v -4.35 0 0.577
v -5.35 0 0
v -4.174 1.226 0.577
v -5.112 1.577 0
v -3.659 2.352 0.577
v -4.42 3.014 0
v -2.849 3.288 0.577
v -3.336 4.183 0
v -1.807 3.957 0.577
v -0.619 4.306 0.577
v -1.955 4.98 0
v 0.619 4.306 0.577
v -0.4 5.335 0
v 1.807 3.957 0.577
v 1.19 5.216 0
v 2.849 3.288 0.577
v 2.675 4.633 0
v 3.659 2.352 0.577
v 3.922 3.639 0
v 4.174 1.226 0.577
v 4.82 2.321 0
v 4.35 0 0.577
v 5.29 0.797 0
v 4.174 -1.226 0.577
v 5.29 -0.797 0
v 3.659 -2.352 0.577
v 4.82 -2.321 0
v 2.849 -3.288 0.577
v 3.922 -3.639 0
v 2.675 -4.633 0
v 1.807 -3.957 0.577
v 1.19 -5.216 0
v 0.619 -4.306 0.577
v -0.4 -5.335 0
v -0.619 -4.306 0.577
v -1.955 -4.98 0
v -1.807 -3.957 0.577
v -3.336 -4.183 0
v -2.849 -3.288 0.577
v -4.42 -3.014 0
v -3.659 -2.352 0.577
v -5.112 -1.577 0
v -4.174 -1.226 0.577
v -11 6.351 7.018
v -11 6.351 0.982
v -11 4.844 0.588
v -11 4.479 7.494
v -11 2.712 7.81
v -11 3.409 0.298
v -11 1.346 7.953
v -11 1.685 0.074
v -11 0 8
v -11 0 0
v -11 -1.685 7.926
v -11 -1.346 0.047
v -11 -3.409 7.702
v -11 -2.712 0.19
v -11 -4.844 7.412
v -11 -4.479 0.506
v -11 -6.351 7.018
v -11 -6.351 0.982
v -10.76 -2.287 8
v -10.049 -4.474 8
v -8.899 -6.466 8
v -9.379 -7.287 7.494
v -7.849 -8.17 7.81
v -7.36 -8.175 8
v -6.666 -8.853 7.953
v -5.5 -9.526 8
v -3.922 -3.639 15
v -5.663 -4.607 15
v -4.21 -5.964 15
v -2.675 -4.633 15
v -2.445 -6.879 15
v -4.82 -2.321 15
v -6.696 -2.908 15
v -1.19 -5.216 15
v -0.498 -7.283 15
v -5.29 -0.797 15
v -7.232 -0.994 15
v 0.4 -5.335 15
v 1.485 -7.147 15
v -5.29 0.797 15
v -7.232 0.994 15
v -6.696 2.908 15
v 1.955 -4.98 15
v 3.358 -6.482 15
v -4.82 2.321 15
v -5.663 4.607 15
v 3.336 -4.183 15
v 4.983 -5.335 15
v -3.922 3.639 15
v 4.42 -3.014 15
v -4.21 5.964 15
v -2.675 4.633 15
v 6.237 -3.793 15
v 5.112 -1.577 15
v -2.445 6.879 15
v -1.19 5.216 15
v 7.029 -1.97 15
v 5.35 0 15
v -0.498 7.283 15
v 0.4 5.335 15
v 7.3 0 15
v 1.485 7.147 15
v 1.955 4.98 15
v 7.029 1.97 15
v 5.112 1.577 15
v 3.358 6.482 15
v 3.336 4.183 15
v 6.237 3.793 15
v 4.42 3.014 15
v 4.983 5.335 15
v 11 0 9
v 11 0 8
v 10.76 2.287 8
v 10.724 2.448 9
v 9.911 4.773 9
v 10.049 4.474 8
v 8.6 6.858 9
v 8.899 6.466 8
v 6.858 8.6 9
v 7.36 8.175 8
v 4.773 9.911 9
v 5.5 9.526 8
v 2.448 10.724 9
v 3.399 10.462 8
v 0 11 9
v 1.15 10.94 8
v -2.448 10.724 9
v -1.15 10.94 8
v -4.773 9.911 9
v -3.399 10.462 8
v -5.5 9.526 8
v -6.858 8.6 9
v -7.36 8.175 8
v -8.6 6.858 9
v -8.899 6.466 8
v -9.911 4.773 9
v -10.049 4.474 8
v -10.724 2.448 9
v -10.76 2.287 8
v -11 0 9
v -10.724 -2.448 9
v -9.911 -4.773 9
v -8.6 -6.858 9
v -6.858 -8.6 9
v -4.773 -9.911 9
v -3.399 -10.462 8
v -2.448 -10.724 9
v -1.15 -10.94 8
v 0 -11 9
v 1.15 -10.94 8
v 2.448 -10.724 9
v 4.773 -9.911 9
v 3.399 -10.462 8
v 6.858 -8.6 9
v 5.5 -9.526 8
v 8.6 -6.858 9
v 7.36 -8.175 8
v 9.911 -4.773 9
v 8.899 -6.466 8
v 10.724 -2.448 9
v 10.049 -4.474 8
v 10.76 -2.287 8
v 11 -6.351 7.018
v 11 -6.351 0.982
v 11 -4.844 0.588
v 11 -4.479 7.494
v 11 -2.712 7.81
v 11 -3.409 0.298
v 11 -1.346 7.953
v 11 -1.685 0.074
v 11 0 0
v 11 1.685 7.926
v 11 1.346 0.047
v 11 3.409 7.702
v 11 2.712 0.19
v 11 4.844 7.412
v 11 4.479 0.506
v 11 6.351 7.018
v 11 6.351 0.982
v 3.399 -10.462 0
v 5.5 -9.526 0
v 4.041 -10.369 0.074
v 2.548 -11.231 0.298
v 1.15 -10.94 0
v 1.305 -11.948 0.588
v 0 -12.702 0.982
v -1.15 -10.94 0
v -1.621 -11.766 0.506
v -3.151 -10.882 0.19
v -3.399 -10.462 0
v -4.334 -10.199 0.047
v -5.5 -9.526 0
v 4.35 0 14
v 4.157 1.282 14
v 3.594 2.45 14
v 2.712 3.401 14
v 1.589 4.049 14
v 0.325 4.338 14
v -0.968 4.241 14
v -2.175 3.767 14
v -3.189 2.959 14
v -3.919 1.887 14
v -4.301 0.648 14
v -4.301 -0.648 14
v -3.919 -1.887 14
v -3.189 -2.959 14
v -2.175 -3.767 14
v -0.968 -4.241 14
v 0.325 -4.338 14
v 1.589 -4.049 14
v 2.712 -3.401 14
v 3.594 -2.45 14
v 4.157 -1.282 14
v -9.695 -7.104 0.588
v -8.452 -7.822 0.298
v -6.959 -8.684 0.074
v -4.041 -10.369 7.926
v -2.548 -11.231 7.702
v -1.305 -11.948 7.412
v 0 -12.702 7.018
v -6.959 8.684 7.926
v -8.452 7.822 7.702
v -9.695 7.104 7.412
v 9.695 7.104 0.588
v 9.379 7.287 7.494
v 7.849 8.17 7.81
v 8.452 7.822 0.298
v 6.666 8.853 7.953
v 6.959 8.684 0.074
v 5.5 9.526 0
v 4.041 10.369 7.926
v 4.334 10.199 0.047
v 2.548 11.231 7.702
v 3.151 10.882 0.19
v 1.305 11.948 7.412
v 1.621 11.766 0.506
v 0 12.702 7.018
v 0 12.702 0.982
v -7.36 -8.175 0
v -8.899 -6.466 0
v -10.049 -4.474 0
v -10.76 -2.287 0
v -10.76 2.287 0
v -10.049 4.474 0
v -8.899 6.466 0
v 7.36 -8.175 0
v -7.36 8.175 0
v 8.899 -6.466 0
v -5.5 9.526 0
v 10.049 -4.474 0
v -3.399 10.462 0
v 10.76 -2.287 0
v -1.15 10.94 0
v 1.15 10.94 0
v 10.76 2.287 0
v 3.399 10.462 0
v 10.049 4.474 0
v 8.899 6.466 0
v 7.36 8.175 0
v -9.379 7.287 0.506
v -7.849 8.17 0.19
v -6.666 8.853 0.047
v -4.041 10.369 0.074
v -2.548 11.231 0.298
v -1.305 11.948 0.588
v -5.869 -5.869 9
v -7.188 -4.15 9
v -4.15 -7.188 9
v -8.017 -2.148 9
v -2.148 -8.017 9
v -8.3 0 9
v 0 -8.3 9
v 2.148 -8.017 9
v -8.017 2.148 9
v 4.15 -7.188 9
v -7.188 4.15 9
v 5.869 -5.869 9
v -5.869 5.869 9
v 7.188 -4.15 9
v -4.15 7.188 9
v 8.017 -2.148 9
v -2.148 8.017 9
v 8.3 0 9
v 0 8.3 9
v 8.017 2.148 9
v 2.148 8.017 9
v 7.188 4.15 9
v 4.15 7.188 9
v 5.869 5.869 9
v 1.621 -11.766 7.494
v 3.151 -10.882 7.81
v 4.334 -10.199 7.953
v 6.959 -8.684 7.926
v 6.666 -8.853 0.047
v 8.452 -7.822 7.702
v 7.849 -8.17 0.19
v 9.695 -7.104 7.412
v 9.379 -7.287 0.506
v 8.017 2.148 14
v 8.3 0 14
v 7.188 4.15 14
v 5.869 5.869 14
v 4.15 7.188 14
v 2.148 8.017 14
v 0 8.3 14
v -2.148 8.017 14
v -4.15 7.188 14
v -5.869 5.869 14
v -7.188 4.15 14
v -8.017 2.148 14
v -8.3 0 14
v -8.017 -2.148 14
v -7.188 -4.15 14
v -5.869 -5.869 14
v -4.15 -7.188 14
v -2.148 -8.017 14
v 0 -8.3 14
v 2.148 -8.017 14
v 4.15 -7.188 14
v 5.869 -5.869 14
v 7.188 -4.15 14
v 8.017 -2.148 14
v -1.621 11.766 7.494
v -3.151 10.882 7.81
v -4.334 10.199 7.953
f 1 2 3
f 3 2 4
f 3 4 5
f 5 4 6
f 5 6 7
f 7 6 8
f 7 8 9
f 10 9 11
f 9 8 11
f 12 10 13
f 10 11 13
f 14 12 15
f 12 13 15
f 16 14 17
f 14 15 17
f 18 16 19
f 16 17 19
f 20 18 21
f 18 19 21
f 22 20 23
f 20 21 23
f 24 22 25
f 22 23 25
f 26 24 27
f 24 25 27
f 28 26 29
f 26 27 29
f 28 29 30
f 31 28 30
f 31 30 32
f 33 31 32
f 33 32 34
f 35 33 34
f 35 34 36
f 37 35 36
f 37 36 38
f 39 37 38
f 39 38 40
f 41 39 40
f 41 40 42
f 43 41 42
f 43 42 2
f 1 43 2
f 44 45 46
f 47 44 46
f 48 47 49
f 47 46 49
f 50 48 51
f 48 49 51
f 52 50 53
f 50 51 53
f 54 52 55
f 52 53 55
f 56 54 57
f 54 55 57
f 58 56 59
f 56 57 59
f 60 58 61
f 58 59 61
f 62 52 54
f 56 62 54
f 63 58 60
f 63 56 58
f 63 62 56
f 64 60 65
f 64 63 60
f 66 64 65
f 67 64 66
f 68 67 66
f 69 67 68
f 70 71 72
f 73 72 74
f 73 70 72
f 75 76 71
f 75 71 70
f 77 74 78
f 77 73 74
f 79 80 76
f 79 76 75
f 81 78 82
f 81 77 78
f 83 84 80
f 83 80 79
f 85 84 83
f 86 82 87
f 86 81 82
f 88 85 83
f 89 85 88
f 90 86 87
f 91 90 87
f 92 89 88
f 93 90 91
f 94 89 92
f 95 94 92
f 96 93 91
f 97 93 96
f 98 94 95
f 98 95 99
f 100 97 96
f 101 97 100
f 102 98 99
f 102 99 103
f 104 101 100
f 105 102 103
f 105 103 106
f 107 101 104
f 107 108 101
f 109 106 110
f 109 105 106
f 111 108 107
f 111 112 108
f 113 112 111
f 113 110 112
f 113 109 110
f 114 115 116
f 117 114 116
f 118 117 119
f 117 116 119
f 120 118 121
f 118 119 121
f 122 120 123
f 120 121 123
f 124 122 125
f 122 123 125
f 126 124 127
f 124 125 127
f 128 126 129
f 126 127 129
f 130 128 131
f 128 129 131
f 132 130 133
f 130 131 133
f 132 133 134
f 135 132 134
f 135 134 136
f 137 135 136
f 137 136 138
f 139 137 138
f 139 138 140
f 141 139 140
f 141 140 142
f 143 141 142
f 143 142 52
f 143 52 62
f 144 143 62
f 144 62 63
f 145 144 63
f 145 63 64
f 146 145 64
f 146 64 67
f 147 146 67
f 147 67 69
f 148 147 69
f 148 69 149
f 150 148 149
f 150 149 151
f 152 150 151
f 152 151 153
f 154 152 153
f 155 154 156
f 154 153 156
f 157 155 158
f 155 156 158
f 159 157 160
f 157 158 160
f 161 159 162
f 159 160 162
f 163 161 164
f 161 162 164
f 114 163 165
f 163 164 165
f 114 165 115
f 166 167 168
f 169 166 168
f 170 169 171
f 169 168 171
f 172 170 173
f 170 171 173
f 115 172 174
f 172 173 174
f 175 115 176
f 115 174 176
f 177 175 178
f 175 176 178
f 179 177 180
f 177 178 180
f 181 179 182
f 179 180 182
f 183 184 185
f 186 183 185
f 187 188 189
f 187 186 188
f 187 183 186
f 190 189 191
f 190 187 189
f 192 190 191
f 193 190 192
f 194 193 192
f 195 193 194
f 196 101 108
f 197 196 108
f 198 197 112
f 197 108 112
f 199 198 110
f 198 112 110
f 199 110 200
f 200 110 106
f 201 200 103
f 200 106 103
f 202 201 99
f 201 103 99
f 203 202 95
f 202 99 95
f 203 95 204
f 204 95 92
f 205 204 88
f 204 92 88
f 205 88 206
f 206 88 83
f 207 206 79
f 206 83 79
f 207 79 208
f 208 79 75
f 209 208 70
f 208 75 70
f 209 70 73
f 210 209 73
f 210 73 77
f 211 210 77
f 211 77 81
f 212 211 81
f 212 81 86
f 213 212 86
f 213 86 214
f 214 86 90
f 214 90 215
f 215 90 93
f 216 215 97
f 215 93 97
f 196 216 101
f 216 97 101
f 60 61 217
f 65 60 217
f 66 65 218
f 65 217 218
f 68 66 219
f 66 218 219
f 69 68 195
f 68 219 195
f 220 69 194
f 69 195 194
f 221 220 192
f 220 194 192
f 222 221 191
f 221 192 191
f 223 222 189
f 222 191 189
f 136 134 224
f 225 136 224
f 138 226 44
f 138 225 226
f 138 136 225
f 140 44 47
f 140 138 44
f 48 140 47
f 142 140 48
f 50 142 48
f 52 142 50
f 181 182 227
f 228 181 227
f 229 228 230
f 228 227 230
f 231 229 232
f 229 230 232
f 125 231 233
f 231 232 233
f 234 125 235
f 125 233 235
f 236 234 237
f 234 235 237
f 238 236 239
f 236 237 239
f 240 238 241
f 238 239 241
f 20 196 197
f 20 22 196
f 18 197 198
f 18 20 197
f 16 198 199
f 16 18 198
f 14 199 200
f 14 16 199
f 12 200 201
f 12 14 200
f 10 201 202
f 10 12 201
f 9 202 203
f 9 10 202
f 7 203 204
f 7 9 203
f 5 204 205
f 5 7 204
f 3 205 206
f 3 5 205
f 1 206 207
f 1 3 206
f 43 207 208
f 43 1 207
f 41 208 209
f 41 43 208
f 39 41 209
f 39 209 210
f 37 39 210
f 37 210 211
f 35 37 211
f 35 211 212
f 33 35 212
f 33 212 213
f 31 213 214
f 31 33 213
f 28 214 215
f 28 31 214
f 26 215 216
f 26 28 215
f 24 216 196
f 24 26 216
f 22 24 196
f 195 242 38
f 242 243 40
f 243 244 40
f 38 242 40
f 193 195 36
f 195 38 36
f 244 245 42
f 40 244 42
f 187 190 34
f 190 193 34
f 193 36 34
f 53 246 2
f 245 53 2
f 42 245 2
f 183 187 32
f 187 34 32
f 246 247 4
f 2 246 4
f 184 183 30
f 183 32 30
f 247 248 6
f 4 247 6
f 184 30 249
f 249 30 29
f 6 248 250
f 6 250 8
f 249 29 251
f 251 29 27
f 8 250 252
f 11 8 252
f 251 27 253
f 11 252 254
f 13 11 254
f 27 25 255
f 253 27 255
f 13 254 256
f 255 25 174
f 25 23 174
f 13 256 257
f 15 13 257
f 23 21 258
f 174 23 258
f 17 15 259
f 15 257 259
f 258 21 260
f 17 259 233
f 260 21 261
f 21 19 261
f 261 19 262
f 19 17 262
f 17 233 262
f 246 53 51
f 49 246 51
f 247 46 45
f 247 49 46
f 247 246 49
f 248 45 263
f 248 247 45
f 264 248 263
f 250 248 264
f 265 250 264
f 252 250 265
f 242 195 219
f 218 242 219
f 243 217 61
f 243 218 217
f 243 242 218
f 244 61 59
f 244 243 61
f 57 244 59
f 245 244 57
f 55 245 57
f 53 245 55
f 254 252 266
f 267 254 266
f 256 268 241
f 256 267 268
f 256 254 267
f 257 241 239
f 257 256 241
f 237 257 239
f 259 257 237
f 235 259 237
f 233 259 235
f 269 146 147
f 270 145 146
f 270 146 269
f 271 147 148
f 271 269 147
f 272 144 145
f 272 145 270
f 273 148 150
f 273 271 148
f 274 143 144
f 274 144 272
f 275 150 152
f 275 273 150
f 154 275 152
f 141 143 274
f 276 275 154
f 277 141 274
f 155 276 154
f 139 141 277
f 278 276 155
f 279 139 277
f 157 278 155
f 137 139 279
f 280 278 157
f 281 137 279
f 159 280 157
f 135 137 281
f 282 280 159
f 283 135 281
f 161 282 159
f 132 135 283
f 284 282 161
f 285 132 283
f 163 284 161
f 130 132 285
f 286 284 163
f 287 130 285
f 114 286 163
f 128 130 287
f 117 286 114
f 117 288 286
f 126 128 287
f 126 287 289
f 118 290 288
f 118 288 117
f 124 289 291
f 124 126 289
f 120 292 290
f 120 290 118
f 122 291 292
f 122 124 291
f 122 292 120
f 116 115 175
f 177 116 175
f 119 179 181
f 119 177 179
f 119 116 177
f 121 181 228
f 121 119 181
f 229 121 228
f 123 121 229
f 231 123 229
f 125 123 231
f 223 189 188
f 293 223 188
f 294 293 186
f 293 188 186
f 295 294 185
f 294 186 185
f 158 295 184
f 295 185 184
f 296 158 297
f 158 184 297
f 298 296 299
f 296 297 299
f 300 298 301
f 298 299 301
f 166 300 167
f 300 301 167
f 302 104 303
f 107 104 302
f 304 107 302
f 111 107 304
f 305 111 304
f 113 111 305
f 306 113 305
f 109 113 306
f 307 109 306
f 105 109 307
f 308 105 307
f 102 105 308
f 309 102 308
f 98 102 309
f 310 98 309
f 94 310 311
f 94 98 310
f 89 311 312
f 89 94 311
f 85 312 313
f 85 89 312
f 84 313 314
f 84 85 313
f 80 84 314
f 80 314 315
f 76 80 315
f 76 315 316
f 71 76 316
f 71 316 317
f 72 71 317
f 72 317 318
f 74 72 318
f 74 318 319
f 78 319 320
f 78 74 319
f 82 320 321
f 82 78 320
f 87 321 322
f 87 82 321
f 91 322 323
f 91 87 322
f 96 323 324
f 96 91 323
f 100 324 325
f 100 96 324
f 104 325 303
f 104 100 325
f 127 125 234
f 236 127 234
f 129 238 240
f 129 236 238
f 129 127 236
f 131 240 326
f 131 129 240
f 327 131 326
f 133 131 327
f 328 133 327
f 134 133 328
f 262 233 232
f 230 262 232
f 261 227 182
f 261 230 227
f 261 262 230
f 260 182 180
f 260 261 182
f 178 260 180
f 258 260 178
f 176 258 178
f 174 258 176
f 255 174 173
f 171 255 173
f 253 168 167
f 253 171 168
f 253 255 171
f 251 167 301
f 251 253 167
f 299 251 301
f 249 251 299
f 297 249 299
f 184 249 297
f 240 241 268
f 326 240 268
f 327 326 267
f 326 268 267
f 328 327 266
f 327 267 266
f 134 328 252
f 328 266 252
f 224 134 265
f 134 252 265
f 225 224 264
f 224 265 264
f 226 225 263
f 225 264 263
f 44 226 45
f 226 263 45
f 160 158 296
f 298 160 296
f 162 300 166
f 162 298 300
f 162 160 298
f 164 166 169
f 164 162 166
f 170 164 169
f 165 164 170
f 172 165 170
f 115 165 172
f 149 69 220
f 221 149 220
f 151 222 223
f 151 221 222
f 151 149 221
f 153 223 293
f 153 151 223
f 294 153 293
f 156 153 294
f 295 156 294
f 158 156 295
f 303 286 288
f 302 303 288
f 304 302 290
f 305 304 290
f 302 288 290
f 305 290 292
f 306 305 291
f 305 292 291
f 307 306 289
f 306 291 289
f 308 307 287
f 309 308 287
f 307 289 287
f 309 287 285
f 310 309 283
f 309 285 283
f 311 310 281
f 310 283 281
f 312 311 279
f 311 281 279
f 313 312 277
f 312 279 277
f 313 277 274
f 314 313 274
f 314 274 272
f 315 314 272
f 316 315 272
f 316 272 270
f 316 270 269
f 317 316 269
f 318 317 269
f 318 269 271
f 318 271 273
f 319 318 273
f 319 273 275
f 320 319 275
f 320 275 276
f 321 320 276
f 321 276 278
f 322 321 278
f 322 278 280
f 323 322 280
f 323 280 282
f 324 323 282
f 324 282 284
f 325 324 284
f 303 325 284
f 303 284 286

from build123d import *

# Parameters (mm, degrees)
SKETCH1_R                            = 4.35
BOSS_EXTRUDE1_DEPTH                  = 8
SKETCH2_R                            = 11
SKETCH2_R_2                          = 4.35
BOSS_EXTRUDE2_DEPTH                  = 1
SKETCH3_R                            = 8.3
SKETCH3_R_2                          = 4.35
BOSS_EXTRUDE3_DEPTH                  = 6
SZKIC9_OUTSIDE_W                     = 34.824
SZKIC9_OUTSIDE_H                     = 38.228
SZKIC9_OUTSIDE_R                     = 11
WYTNIJ_WYCI_GNI_CIE3_DEPTH           = 1
WYTNIJ_WYCI_GNI_CIE3_DRAFT           = -60
SZKIC10_OUTSIDE_W                    = 34.824
SZKIC10_OUTSIDE_H                    = 38.228
SZKIC10_OUTSIDE_R                    = 11
WYTNIJ_WYCI_GNI_CIE4_DEPTH           = 1
WYTNIJ_WYCI_GNI_CIE4_DRAFT           = -60
SZKIC11_R                            = 5.35
WYTNIJ_WYCI_GNI_CIE5_DEPTH           = 1
WYTNIJ_WYCI_GNI_CIE5_DRAFT           = -60
SZKIC13_OUTSIDE_W                    = 33.36
SZKIC13_OUTSIDE_H                    = 36.764
SZKIC13_OUTSIDE_R                    = 7.3
WYTNIJ_WYCI_GNI_CIE8_DEPTH           = 1
WYTNIJ_WYCI_GNI_CIE8_DRAFT           = -45
SZKIC13_OUTSIDE_R_2                  = 5.35
WYTNIJ_WYCI_GNI_CIE8_PROFILE_2_DEPTH = 1
WYTNIJ_WYCI_GNI_CIE8_PROFILE_2_DRAFT = -45


with BuildPart() as part:
    # Sketch1 → Boss-Extrude1 (new body)
    with BuildSketch(Plane.XY):
        Polygon((-11, 6.350852961), (-11, -6.350852961), (0, -12.701705922), (11, -6.350852961), (11, 6.350852961), (0, 12.701705922), align=None)
        Circle(SKETCH1_R, mode=Mode.SUBTRACT)
    extrude(amount=BOSS_EXTRUDE1_DEPTH)

    # Sketch2 → Boss-Extrude2 (add)
    with BuildSketch(Plane.XY.offset(8)):
        Circle(SKETCH2_R)
        Circle(SKETCH2_R_2, mode=Mode.SUBTRACT)
    extrude(amount=BOSS_EXTRUDE2_DEPTH)

    # Sketch3 → Boss-Extrude3 (add)
    with BuildSketch(Plane.XY.offset(9)):
        Circle(SKETCH3_R)
        Circle(SKETCH3_R_2, mode=Mode.SUBTRACT)
    extrude(amount=BOSS_EXTRUDE3_DEPTH)


with BuildPart() as wytnij_wyci_gni_cie3_tool:
    # Szkic9 outside → Wytnij-wyciągnięcie3 (with draft: the straight prism first)
    with BuildSketch(Plane(origin=(0, 0, 0), x_dir=(-1, 0, 0), z_dir=(0, 0, -1))):
        Rectangle(SZKIC9_OUTSIDE_W, SZKIC9_OUTSIDE_H)
        with Locations(Location((0, 0, 0), (0, 0, 180))):
            Circle(SZKIC9_OUTSIDE_R, mode=Mode.SUBTRACT)
    extrude(amount=-WYTNIJ_WYCI_GNI_CIE3_DEPTH)
    # Wytnij-wyciągnięcie3: the draft: its side faces are tilted about the plane it starts from
    wytnij_wyci_gni_cie3_sides = [wytnij_wyci_gni_cie3_tool.faces().sort_by_distance(p)[0] for p in [
        (0, -19.114, 0.5),
        (-17.412, 0, 0.5),
        (0, 19.114, 0.5),
        (17.412, 0, 0.5),
        (-11, 0, 0.5),
    ]]
    draft(wytnij_wyci_gni_cie3_sides, Plane(origin=(0, 0, 0), x_dir=(-1, 0, 0), z_dir=(0, 0, -1)), WYTNIJ_WYCI_GNI_CIE3_DRAFT)


with BuildPart() as part_1:
    add(part.part)

    # Wytnij-wyciągnięcie3: cut by wytnij_wyci_gni_cie3_tool
    add(wytnij_wyci_gni_cie3_tool.part, mode=Mode.SUBTRACT)


with BuildPart() as wytnij_wyci_gni_cie4_tool:
    # Szkic10 outside → Wytnij-wyciągnięcie4 (with draft: the straight prism first)
    with BuildSketch(Plane.XY.offset(8)):
        Rectangle(SZKIC10_OUTSIDE_W, SZKIC10_OUTSIDE_H)
        Circle(SZKIC10_OUTSIDE_R, mode=Mode.SUBTRACT)
    extrude(amount=-WYTNIJ_WYCI_GNI_CIE4_DEPTH)
    # Wytnij-wyciągnięcie4: the draft: its side faces are tilted about the plane it starts from
    wytnij_wyci_gni_cie4_sides = [wytnij_wyci_gni_cie4_tool.faces().sort_by_distance(p)[0] for p in [
        (0, -19.114, 7.5),
        (17.412, 0, 7.5),
        (0, 19.114, 7.5),
        (-17.412, 0, 7.5),
        (-11, 0, 7.5),
    ]]
    draft(wytnij_wyci_gni_cie4_sides, Plane.XY.offset(8), WYTNIJ_WYCI_GNI_CIE4_DRAFT)


with BuildPart() as part_2:
    add(part_1.part)

    # Wytnij-wyciągnięcie4: cut by wytnij_wyci_gni_cie4_tool
    add(wytnij_wyci_gni_cie4_tool.part, mode=Mode.SUBTRACT)


with BuildPart() as wytnij_wyci_gni_cie5_tool:
    # Szkic11 → Wytnij-wyciągnięcie5 (with draft: the straight prism first)
    with BuildSketch(Plane(origin=(0, 0, 0), x_dir=(-1, 0, 0), z_dir=(0, 0, -1))):
        Circle(SZKIC11_R)
    extrude(amount=-WYTNIJ_WYCI_GNI_CIE5_DEPTH)
    # Wytnij-wyciągnięcie5: the draft: its side faces are tilted about the plane it starts from
    wytnij_wyci_gni_cie5_sides = [wytnij_wyci_gni_cie5_tool.faces().sort_by_distance(p)[0] for p in [
        (5.35, 0, 0.5),
    ]]
    draft(wytnij_wyci_gni_cie5_sides, Plane(origin=(0, 0, 0), x_dir=(-1, 0, 0), z_dir=(0, 0, -1)), WYTNIJ_WYCI_GNI_CIE5_DRAFT)


with BuildPart() as part_3:
    add(part_2.part)

    # Wytnij-wyciągnięcie5: cut by wytnij_wyci_gni_cie5_tool
    add(wytnij_wyci_gni_cie5_tool.part, mode=Mode.SUBTRACT)


with BuildPart() as wytnij_wyci_gni_cie8_tool:
    # Szkic13 outside → Wytnij-wyciągnięcie8 (with draft: the straight prism first)
    with BuildSketch(Plane.XY.offset(15)):
        Rectangle(SZKIC13_OUTSIDE_W, SZKIC13_OUTSIDE_H)
        Circle(SZKIC13_OUTSIDE_R, mode=Mode.SUBTRACT)
    extrude(amount=-WYTNIJ_WYCI_GNI_CIE8_DEPTH)
    # Wytnij-wyciągnięcie8: the draft: its side faces are tilted about the plane it starts from
    wytnij_wyci_gni_cie8_sides = [wytnij_wyci_gni_cie8_tool.faces().sort_by_distance(p)[0] for p in [
        (0, -18.382, 14.5),
        (16.68, 0, 14.5),
        (0, 18.382, 14.5),
        (-16.68, 0, 14.5),
        (-7.3, 0, 14.5),
    ]]
    draft(wytnij_wyci_gni_cie8_sides, Plane.XY.offset(15), WYTNIJ_WYCI_GNI_CIE8_DRAFT)


with BuildPart() as part_4:
    add(part_3.part)

    # Wytnij-wyciągnięcie8: cut by wytnij_wyci_gni_cie8_tool
    add(wytnij_wyci_gni_cie8_tool.part, mode=Mode.SUBTRACT)


with BuildPart() as wytnij_wyci_gni_cie8_profile_2_tool:
    # Szkic13 outside → Wytnij-wyciągnięcie8 profile 2 (with draft: the straight prism first)
    with BuildSketch(Plane.XY.offset(15)):
        Circle(SZKIC13_OUTSIDE_R_2)
    extrude(amount=-WYTNIJ_WYCI_GNI_CIE8_PROFILE_2_DEPTH)
    # Wytnij-wyciągnięcie8 profile 2: the draft: its side faces are tilted about the plane it starts from
    wytnij_wyci_gni_cie8_profile_2_sides = [wytnij_wyci_gni_cie8_profile_2_tool.faces().sort_by_distance(p)[0] for p in [
        (-5.35, 0, 14.5),
    ]]
    draft(wytnij_wyci_gni_cie8_profile_2_sides, Plane.XY.offset(15), WYTNIJ_WYCI_GNI_CIE8_PROFILE_2_DRAFT)


with BuildPart() as part_5:
    add(part_4.part)

    # Wytnij-wyciągnięcie8 profile 2: cut by wytnij_wyci_gni_cie8_profile_2_tool
    add(wytnij_wyci_gni_cie8_profile_2_tool.part, mode=Mode.SUBTRACT)


solid = part_5.part
